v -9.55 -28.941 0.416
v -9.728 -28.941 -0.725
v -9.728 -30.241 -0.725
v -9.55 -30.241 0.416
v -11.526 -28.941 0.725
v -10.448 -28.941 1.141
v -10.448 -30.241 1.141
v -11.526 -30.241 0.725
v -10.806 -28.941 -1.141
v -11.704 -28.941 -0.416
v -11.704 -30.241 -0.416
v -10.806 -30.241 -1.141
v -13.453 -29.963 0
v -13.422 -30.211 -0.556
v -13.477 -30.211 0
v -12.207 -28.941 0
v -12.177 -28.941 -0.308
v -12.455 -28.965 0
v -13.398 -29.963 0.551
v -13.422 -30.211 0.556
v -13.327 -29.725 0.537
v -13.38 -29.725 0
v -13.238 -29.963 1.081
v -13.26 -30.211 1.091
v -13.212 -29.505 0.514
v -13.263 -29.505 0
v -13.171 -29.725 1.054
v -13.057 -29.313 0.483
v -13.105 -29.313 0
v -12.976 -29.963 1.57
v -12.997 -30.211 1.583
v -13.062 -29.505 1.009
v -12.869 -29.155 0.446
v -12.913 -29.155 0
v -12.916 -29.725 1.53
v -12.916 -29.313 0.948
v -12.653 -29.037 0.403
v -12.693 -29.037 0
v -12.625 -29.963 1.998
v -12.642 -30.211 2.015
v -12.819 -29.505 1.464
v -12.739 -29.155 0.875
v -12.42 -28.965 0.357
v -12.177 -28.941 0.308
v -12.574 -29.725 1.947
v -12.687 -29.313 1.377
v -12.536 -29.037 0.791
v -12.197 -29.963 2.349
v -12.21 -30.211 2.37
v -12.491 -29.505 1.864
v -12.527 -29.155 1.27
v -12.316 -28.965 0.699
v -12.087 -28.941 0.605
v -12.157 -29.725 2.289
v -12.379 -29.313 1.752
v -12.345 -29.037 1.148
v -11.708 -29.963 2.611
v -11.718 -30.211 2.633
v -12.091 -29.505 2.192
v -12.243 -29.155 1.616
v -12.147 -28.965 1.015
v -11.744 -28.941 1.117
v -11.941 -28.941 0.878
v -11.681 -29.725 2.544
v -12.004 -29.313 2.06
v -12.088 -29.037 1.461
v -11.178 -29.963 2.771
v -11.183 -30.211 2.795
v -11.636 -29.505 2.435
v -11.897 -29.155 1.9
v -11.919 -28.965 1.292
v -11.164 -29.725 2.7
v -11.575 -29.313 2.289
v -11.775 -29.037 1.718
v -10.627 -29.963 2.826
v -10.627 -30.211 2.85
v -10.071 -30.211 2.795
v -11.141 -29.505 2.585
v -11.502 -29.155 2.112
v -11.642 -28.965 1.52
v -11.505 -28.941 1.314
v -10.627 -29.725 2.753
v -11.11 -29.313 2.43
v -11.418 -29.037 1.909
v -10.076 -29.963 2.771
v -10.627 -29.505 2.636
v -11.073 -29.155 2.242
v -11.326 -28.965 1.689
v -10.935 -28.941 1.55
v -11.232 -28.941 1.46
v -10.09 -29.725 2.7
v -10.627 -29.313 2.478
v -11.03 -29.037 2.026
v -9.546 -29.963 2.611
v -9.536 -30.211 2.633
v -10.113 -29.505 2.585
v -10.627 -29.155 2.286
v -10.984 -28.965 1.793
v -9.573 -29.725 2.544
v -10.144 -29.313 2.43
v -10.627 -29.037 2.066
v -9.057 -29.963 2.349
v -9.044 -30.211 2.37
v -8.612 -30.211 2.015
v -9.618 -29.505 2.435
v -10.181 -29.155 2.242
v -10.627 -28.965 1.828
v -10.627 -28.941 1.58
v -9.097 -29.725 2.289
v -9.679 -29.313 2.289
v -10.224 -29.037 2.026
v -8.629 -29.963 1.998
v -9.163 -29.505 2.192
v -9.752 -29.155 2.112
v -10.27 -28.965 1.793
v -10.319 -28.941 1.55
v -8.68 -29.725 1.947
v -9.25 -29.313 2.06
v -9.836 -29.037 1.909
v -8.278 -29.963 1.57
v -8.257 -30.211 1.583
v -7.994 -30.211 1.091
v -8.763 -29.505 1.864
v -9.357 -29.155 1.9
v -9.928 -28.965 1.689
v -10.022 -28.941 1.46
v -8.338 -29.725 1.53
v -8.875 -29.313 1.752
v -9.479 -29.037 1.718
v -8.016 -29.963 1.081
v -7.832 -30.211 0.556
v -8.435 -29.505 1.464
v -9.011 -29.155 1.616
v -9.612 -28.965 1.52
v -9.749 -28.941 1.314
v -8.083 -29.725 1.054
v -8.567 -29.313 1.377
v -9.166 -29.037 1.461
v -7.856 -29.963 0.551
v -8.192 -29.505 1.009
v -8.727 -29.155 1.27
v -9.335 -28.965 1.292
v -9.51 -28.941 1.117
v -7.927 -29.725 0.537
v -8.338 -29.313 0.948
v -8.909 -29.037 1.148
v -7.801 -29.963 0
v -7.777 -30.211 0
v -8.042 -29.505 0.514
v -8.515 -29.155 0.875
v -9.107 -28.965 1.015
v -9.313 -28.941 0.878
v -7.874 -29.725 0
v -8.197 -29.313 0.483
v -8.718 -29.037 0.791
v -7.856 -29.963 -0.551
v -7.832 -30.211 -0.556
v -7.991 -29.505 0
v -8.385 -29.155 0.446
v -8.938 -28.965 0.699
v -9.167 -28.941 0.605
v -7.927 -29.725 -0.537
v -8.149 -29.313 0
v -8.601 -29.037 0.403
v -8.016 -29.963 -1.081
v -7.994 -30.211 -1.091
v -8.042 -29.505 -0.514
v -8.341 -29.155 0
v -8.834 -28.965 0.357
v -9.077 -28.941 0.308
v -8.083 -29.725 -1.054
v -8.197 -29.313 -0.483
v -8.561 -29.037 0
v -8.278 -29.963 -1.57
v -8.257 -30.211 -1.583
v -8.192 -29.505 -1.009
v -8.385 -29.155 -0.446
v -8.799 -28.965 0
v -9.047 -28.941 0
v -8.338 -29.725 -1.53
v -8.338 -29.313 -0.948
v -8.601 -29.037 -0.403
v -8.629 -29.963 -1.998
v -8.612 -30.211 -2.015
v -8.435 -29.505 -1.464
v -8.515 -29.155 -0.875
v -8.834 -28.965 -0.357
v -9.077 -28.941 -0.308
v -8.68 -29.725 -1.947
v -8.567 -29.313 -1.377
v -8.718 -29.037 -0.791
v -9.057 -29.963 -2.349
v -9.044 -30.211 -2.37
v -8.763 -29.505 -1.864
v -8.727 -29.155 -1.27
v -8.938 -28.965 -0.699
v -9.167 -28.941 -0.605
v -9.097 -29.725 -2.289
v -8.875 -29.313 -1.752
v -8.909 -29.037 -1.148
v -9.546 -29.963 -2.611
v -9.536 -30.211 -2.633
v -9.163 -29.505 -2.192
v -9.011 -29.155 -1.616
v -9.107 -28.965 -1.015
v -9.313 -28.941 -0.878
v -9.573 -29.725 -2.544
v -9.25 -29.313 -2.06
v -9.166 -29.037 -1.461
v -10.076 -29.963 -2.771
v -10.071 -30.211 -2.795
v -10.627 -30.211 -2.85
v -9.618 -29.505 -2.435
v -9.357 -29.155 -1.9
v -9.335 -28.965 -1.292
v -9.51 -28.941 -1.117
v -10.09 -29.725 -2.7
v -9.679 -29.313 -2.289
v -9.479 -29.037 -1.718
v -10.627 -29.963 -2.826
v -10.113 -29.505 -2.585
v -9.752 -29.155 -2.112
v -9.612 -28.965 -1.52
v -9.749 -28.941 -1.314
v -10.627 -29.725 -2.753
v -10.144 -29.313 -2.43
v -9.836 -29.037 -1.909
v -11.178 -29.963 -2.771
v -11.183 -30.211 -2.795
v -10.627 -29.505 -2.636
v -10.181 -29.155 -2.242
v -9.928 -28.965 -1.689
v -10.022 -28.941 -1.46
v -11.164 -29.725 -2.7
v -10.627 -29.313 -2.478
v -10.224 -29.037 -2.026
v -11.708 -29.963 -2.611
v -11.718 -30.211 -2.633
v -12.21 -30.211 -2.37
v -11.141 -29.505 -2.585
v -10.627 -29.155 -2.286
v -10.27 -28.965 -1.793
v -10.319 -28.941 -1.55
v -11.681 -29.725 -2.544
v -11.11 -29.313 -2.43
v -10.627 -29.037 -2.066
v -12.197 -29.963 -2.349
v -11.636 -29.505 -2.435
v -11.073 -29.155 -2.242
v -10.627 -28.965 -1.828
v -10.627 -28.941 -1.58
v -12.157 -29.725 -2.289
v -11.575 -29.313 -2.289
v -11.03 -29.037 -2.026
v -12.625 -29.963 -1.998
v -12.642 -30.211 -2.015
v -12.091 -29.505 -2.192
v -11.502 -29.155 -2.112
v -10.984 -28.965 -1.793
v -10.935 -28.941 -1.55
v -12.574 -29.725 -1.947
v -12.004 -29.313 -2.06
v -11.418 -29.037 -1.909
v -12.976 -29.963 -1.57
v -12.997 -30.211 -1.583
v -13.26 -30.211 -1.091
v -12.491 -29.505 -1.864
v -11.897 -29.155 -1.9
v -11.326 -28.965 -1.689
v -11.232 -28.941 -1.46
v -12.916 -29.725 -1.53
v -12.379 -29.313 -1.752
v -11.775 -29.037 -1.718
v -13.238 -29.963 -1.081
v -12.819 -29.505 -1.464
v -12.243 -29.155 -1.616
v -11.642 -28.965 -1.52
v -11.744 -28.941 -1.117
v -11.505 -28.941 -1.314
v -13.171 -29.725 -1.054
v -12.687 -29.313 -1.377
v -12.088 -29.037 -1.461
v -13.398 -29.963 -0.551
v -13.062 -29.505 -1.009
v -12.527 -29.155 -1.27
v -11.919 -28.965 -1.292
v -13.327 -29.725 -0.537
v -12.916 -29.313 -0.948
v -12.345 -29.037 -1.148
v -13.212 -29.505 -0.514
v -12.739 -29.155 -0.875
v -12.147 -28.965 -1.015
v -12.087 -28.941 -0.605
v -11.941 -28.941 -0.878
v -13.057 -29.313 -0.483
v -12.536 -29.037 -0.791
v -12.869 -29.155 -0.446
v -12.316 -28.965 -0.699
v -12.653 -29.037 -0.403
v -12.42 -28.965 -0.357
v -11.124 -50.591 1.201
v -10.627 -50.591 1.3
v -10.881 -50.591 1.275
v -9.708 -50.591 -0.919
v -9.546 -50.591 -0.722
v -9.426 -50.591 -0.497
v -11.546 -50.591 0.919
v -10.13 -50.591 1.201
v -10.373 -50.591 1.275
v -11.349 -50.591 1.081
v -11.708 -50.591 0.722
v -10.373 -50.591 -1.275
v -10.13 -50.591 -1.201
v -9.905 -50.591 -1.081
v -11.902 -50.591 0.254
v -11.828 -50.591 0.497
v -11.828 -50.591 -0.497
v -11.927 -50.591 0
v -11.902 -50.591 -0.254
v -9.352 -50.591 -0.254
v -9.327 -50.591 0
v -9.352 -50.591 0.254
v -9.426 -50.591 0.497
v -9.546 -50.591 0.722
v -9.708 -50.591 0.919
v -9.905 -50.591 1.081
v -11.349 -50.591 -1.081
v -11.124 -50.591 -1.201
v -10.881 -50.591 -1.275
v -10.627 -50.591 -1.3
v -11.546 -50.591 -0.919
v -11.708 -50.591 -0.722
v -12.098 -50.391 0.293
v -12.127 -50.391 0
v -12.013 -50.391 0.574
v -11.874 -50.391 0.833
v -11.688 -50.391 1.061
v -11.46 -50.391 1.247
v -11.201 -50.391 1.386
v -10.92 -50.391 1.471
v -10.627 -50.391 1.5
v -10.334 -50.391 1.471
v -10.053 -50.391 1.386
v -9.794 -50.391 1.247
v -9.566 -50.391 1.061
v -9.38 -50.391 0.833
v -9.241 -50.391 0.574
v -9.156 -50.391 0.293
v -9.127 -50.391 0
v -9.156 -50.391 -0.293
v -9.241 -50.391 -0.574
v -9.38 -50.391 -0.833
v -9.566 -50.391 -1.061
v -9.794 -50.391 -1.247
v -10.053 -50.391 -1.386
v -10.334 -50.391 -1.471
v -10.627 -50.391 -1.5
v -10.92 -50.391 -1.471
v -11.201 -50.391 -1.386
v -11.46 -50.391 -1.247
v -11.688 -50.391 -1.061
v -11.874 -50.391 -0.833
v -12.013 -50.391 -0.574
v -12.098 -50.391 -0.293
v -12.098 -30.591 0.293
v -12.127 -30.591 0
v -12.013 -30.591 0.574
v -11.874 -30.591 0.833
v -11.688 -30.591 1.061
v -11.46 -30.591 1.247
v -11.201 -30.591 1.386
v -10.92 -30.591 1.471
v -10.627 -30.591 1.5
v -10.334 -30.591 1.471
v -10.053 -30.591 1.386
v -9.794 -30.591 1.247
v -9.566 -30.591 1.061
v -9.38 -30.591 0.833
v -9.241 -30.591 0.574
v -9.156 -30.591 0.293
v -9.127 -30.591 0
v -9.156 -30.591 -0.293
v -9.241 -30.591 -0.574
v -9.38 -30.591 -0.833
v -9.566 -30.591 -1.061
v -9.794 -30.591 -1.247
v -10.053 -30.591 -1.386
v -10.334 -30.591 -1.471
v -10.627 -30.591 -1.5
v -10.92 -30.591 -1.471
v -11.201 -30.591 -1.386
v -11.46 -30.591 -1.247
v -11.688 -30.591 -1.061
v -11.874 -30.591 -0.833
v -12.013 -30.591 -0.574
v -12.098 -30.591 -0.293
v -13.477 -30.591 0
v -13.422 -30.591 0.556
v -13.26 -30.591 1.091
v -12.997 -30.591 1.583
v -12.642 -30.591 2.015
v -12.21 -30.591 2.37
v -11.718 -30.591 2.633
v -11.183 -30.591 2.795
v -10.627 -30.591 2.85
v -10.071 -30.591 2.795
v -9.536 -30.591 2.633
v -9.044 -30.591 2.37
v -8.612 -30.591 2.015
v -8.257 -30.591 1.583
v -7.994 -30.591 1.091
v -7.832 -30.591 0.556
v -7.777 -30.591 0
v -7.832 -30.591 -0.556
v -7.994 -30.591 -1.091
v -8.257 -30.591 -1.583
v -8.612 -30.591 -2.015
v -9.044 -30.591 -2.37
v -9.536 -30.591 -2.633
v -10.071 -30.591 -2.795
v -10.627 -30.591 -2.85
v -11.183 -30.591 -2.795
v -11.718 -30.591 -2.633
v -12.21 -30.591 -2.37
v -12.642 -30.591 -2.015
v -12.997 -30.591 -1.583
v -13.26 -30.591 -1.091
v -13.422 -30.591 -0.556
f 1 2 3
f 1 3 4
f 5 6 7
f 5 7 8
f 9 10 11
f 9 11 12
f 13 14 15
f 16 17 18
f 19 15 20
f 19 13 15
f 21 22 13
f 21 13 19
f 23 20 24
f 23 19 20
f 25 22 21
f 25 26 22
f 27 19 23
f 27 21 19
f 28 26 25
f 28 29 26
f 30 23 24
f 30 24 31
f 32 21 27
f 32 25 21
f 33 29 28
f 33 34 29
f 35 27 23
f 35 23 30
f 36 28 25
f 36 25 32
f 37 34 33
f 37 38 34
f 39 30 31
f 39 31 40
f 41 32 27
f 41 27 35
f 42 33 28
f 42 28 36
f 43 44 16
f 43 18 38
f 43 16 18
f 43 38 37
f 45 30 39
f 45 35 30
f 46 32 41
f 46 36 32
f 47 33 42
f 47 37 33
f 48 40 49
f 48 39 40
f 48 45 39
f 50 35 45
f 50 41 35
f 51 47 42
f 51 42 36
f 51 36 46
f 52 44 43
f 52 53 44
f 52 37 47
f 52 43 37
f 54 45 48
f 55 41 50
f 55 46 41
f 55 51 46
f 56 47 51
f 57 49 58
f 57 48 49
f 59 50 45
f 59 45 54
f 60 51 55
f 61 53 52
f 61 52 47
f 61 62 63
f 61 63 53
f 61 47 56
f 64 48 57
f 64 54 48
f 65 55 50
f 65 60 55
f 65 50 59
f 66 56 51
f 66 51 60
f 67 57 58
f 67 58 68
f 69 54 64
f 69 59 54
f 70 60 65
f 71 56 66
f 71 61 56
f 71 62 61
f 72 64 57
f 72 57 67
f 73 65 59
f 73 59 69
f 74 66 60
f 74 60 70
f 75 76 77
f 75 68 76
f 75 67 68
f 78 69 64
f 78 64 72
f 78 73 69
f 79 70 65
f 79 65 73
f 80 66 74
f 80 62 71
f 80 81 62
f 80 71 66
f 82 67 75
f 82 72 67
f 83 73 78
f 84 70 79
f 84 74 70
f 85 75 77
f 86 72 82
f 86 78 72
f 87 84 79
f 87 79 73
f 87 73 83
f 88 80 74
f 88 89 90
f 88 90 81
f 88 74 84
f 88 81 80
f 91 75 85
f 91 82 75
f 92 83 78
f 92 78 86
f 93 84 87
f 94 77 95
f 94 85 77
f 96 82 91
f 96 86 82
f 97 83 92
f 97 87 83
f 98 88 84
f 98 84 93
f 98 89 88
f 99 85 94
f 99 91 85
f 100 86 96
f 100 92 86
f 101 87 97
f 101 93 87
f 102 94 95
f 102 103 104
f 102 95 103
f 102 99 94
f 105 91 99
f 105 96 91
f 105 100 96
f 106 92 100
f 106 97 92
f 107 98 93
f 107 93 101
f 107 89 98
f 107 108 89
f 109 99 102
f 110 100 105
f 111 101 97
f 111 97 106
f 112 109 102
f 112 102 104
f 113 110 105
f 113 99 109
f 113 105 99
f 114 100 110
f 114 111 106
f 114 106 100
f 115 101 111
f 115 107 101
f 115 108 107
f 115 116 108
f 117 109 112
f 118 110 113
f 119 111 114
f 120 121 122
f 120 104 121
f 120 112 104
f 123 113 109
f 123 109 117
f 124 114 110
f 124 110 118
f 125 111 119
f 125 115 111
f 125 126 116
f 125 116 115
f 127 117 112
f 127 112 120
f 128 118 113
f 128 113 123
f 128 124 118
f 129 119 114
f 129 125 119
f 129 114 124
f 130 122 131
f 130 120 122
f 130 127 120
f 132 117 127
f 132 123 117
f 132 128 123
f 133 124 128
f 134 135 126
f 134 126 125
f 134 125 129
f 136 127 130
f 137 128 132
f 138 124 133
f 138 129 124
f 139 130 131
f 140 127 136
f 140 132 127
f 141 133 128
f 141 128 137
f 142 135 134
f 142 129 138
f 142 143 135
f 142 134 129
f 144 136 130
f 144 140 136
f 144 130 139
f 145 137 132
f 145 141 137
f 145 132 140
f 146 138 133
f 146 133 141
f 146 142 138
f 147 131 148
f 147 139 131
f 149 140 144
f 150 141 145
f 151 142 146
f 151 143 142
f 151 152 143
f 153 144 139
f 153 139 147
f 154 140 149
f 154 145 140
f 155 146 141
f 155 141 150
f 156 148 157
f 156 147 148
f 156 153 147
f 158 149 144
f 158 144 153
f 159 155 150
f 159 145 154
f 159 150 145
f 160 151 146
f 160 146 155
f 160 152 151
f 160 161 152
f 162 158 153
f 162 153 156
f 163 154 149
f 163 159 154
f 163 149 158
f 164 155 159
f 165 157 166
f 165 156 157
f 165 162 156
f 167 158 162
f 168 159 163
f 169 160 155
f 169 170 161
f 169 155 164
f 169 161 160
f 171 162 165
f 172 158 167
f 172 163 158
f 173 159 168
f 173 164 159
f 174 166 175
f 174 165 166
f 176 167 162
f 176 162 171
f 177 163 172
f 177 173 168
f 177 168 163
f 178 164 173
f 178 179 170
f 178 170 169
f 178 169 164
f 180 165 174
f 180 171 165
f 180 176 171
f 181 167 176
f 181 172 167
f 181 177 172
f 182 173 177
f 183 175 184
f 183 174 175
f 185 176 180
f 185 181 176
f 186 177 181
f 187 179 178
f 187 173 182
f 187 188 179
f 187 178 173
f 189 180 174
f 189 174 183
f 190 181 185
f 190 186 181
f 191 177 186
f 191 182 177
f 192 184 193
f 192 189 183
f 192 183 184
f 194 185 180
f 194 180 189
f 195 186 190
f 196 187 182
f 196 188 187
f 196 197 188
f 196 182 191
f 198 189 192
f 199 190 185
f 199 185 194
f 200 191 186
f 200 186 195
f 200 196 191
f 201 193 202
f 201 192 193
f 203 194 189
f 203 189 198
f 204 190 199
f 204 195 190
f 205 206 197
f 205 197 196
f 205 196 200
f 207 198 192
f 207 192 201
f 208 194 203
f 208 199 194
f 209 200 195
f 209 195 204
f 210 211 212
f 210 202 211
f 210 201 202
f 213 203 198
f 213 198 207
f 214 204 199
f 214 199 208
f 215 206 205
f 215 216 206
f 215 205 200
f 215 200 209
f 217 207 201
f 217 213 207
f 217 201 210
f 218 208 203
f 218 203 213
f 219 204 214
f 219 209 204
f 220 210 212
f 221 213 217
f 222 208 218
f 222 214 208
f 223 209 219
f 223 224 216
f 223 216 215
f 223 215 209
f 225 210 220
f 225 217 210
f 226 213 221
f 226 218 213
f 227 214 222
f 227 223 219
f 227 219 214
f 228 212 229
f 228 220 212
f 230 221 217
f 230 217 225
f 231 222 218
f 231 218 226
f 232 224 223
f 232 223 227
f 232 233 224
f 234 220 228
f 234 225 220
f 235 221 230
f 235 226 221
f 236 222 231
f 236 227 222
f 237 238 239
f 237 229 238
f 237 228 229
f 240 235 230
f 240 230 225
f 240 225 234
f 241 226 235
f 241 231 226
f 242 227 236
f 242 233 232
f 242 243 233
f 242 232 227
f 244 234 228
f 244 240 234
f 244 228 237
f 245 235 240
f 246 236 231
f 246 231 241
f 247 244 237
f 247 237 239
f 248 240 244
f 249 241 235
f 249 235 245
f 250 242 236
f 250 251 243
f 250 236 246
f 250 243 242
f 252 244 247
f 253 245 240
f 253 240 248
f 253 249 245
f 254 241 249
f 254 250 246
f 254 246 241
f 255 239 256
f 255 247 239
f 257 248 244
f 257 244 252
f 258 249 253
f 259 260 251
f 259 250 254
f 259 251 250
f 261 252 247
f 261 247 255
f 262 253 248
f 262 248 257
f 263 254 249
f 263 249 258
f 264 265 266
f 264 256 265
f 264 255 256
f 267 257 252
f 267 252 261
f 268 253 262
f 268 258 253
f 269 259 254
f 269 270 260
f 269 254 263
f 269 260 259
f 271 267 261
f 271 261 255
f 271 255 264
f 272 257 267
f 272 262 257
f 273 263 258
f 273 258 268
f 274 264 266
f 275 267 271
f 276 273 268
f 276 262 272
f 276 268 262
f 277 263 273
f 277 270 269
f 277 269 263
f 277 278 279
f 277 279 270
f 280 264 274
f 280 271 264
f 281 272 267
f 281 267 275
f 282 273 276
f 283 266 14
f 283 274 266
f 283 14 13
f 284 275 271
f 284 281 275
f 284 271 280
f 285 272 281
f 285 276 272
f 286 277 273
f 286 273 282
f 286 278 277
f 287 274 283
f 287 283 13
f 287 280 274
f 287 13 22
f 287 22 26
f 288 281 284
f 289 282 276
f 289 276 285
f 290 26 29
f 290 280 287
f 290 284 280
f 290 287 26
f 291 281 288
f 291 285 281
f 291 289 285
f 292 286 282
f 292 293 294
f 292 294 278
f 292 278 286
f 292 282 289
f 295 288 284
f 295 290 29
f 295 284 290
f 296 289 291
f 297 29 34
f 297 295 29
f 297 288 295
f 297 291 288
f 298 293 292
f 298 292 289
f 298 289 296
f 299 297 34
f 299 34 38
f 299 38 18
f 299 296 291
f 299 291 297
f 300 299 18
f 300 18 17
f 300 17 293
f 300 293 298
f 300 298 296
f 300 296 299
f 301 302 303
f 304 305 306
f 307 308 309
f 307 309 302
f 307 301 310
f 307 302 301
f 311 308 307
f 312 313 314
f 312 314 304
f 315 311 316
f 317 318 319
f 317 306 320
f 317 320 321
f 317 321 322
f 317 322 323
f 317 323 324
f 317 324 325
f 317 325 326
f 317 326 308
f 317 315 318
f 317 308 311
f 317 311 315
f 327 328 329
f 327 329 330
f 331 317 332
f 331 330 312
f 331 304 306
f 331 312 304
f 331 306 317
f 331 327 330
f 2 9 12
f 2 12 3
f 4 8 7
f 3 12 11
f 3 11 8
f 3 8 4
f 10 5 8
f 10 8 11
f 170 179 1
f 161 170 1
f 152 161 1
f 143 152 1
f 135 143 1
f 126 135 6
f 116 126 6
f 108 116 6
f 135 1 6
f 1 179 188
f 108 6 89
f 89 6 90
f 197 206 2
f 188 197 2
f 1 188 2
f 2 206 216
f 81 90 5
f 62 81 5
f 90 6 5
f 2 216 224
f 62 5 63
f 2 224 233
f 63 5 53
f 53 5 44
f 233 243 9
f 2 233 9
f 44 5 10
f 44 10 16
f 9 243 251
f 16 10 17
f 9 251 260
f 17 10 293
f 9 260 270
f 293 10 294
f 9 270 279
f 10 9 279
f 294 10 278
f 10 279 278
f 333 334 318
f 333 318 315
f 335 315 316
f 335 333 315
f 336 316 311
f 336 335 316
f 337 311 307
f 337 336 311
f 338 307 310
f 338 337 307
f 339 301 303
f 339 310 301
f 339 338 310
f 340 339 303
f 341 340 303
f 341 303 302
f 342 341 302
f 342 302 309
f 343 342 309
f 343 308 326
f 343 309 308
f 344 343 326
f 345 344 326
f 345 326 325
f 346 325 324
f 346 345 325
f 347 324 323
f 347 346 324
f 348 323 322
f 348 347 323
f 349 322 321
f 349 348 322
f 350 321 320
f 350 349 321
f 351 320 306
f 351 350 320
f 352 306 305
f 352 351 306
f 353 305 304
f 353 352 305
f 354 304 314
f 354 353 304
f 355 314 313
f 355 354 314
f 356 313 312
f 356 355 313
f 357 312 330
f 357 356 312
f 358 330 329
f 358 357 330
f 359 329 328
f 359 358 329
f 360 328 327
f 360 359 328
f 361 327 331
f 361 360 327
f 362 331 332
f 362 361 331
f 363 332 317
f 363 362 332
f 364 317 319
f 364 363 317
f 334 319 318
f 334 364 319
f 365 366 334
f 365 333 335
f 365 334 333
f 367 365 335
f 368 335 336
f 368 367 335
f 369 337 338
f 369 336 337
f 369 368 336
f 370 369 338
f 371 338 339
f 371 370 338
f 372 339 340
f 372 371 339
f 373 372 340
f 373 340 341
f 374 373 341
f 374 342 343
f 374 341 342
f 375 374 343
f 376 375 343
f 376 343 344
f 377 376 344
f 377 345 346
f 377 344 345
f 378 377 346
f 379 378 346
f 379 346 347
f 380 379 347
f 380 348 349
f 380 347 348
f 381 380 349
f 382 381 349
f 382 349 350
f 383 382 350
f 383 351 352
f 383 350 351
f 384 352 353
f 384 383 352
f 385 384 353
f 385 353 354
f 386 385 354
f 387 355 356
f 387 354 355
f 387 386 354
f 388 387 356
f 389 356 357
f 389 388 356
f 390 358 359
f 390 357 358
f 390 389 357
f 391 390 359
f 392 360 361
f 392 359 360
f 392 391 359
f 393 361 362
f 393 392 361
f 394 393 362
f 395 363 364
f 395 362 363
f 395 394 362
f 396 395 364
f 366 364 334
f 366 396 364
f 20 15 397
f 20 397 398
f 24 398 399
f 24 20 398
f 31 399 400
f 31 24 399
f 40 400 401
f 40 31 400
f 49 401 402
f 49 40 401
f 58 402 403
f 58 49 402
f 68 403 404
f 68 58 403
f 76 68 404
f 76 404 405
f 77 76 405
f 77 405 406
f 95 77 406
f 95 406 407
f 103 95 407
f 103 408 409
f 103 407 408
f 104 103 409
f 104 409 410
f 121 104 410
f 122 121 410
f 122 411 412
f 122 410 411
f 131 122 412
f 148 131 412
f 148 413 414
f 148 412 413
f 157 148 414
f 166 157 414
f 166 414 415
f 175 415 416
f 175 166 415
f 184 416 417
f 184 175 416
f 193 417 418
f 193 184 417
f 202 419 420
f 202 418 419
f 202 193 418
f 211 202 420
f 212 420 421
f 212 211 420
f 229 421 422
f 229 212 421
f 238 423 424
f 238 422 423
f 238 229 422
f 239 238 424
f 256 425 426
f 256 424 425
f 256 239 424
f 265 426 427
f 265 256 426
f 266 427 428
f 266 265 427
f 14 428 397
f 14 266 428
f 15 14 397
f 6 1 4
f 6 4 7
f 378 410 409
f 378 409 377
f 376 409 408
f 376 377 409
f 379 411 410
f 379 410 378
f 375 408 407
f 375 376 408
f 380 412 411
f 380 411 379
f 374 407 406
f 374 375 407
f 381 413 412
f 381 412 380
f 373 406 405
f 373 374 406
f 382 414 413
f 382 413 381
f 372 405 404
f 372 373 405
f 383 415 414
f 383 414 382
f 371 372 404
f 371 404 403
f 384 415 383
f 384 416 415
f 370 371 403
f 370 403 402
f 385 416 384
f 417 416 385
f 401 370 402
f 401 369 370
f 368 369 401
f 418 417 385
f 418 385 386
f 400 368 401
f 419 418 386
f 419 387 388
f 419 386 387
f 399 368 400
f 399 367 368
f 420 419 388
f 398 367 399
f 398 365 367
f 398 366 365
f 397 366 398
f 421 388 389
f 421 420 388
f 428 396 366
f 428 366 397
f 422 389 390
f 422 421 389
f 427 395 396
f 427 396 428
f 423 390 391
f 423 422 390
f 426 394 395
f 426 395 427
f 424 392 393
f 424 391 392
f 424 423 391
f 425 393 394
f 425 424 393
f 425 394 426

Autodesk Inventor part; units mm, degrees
ref_plane "YZ Plane" through (0, 0, 0) normal (1, 0, 0) x (0, 1, 0)
ref_plane "XZ Plane" through (0, 0, 0) normal (0, 1, 0) x (-1, 0, 0)
ref_plane "XY Plane" through (0, 0, 0) normal (0, 0, 1) x (1, 0, 0)
sketch "Sketch1" plane through (0, 0, 0) normal (0, 0, 1) x (1, 0, 0)
  line L0 (-10.627, -30.5907) -> (-13.477, -30.5907)
  line L1 (-10.627, -30.5907) -> (-10.627, -50.5907)
  line L2 (-10.627, -50.5907) -> (-12.127, -50.5907)
  line L3 (-12.127, -50.5907) -> (-12.127, -30.5907)
  line L4 (-10.627, -30.5907) -> (-10.627, -26.5988)
  line L5 (-13.477, -30.5907) -> (-13.477, -30.2107)
  line L6 (-13.477, -30.2107) -> (-13.477, -28.9407)
  line L7 (-13.477, -28.9407) -> (-10.627, -28.9407)
  dimension "d0" = 2.85
  dimension "d2" = 20
  dimension "d3" = 1.5
  dimension "d18" = 0.38
  dimension "d19" = 1.65
revolve "Revolution1" add sketch "Sketch1" angle 360 about axis through (-10.627, -30.5907, 0) along (0, -1, 0)
chamfer "Chamfer2" distance 0.2 angle 45 1 edges at (-9.127, -50.5907, 0)
fillet "Empalme2" radius 1.27 1 edges at (-7.777, -28.9407, 0)
sketch "Boceto2" plane through (-10.627, -28.9407, 0) normal (0, 1, 0) x (1, 0, 0)
  line L0 (0.8985, 0.7252) -> (1.0773, -0.4156)
  line L1 (1.0773, -0.4156) -> (0.1788, -1.1408)
  line L2 (0.1788, -1.1408) -> (-0.8985, -0.7252)
  line L3 (-0.8985, -0.7252) -> (-1.0773, 0.4156)
  line L4 (-1.0773, 0.4156) -> (-0.1788, 1.1408)
  line L5 (-0.1788, 1.1408) -> (0.8985, 0.7252)
  point P0 (10.627, 0)
  point P1 (0, 0)
  dimension "d21" = 2
extrude "Extrusión1" cut sketch "Boceto2" against normal blind 1.3
thread "Rosca2" size "M3x0.5" class "6g" standard "ISO Metric profile" length 430
properties part number "Tornillo Allen cabeeza botón M3x20mm"
